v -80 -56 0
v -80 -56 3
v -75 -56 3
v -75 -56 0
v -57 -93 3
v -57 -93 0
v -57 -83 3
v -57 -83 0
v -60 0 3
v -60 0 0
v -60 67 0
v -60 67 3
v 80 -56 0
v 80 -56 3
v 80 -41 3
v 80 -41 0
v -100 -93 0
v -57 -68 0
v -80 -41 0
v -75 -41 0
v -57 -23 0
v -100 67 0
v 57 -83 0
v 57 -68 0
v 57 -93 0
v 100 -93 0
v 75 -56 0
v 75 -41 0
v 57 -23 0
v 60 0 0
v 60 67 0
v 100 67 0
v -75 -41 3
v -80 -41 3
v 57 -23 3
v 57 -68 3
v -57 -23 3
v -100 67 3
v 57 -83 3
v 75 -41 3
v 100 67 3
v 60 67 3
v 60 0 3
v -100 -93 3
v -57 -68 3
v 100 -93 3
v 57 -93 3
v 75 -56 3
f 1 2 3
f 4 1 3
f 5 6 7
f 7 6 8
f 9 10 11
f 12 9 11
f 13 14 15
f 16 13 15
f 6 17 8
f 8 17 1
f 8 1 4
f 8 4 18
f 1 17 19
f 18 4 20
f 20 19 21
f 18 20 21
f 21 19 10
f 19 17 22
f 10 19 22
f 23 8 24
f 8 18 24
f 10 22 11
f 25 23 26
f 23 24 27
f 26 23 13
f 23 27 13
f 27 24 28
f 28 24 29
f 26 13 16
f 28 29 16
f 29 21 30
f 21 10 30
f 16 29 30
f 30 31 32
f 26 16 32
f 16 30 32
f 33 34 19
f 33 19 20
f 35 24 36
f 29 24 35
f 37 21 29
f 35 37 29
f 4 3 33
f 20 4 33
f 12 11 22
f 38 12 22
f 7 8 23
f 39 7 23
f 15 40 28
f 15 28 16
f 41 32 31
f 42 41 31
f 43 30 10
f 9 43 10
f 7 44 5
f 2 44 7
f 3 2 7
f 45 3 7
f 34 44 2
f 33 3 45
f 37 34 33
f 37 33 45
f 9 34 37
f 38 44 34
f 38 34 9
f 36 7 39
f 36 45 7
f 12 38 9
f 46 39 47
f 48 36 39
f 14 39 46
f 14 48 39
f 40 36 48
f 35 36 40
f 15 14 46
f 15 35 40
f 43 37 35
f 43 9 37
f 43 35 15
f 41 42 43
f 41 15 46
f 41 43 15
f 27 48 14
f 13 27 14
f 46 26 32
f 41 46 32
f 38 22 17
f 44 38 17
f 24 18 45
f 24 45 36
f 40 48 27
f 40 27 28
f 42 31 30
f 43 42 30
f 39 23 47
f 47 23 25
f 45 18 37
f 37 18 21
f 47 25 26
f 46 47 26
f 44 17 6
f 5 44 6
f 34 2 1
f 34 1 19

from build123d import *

# Parameters (mm, degrees)
SKETCH_2_W          = 114
SKETCH_2_H          = 45
EXTRUDE_1_DEPTH     = 3
SKETCH_3_W          = 5
SKETCH_3_H          = 15
CUT_EXTRUDE_1_DEPTH = 10


with BuildPart() as part:
    # 草图2 → 凸台-拉伸1 (new body)
    with BuildSketch(Plane.XY):
        Polygon((60, 67), (60, 0), (-60, 0), (-60, 67), (-100, 67), (-100, -93), (-57, -93), (-57, -83), (57, -83), (57, -93), (100, -93), (100, 67), align=None)
        with Locations((0, -45.5)):
            Rectangle(SKETCH_2_W, SKETCH_2_H, mode=Mode.SUBTRACT)
    extrude(amount=EXTRUDE_1_DEPTH)

    # 草图3 → 切除-拉伸1 (cut)
    with BuildSketch(Plane.XY.offset(3)):
        with Locations((-77.5, -48.5)):
            Rectangle(SKETCH_3_W, SKETCH_3_H)
        with Locations((77.5, -48.5)):
            Rectangle(SKETCH_3_W, SKETCH_3_H)
    extrude(amount=-CUT_EXTRUDE_1_DEPTH, mode=Mode.SUBTRACT)


solid = part.part
